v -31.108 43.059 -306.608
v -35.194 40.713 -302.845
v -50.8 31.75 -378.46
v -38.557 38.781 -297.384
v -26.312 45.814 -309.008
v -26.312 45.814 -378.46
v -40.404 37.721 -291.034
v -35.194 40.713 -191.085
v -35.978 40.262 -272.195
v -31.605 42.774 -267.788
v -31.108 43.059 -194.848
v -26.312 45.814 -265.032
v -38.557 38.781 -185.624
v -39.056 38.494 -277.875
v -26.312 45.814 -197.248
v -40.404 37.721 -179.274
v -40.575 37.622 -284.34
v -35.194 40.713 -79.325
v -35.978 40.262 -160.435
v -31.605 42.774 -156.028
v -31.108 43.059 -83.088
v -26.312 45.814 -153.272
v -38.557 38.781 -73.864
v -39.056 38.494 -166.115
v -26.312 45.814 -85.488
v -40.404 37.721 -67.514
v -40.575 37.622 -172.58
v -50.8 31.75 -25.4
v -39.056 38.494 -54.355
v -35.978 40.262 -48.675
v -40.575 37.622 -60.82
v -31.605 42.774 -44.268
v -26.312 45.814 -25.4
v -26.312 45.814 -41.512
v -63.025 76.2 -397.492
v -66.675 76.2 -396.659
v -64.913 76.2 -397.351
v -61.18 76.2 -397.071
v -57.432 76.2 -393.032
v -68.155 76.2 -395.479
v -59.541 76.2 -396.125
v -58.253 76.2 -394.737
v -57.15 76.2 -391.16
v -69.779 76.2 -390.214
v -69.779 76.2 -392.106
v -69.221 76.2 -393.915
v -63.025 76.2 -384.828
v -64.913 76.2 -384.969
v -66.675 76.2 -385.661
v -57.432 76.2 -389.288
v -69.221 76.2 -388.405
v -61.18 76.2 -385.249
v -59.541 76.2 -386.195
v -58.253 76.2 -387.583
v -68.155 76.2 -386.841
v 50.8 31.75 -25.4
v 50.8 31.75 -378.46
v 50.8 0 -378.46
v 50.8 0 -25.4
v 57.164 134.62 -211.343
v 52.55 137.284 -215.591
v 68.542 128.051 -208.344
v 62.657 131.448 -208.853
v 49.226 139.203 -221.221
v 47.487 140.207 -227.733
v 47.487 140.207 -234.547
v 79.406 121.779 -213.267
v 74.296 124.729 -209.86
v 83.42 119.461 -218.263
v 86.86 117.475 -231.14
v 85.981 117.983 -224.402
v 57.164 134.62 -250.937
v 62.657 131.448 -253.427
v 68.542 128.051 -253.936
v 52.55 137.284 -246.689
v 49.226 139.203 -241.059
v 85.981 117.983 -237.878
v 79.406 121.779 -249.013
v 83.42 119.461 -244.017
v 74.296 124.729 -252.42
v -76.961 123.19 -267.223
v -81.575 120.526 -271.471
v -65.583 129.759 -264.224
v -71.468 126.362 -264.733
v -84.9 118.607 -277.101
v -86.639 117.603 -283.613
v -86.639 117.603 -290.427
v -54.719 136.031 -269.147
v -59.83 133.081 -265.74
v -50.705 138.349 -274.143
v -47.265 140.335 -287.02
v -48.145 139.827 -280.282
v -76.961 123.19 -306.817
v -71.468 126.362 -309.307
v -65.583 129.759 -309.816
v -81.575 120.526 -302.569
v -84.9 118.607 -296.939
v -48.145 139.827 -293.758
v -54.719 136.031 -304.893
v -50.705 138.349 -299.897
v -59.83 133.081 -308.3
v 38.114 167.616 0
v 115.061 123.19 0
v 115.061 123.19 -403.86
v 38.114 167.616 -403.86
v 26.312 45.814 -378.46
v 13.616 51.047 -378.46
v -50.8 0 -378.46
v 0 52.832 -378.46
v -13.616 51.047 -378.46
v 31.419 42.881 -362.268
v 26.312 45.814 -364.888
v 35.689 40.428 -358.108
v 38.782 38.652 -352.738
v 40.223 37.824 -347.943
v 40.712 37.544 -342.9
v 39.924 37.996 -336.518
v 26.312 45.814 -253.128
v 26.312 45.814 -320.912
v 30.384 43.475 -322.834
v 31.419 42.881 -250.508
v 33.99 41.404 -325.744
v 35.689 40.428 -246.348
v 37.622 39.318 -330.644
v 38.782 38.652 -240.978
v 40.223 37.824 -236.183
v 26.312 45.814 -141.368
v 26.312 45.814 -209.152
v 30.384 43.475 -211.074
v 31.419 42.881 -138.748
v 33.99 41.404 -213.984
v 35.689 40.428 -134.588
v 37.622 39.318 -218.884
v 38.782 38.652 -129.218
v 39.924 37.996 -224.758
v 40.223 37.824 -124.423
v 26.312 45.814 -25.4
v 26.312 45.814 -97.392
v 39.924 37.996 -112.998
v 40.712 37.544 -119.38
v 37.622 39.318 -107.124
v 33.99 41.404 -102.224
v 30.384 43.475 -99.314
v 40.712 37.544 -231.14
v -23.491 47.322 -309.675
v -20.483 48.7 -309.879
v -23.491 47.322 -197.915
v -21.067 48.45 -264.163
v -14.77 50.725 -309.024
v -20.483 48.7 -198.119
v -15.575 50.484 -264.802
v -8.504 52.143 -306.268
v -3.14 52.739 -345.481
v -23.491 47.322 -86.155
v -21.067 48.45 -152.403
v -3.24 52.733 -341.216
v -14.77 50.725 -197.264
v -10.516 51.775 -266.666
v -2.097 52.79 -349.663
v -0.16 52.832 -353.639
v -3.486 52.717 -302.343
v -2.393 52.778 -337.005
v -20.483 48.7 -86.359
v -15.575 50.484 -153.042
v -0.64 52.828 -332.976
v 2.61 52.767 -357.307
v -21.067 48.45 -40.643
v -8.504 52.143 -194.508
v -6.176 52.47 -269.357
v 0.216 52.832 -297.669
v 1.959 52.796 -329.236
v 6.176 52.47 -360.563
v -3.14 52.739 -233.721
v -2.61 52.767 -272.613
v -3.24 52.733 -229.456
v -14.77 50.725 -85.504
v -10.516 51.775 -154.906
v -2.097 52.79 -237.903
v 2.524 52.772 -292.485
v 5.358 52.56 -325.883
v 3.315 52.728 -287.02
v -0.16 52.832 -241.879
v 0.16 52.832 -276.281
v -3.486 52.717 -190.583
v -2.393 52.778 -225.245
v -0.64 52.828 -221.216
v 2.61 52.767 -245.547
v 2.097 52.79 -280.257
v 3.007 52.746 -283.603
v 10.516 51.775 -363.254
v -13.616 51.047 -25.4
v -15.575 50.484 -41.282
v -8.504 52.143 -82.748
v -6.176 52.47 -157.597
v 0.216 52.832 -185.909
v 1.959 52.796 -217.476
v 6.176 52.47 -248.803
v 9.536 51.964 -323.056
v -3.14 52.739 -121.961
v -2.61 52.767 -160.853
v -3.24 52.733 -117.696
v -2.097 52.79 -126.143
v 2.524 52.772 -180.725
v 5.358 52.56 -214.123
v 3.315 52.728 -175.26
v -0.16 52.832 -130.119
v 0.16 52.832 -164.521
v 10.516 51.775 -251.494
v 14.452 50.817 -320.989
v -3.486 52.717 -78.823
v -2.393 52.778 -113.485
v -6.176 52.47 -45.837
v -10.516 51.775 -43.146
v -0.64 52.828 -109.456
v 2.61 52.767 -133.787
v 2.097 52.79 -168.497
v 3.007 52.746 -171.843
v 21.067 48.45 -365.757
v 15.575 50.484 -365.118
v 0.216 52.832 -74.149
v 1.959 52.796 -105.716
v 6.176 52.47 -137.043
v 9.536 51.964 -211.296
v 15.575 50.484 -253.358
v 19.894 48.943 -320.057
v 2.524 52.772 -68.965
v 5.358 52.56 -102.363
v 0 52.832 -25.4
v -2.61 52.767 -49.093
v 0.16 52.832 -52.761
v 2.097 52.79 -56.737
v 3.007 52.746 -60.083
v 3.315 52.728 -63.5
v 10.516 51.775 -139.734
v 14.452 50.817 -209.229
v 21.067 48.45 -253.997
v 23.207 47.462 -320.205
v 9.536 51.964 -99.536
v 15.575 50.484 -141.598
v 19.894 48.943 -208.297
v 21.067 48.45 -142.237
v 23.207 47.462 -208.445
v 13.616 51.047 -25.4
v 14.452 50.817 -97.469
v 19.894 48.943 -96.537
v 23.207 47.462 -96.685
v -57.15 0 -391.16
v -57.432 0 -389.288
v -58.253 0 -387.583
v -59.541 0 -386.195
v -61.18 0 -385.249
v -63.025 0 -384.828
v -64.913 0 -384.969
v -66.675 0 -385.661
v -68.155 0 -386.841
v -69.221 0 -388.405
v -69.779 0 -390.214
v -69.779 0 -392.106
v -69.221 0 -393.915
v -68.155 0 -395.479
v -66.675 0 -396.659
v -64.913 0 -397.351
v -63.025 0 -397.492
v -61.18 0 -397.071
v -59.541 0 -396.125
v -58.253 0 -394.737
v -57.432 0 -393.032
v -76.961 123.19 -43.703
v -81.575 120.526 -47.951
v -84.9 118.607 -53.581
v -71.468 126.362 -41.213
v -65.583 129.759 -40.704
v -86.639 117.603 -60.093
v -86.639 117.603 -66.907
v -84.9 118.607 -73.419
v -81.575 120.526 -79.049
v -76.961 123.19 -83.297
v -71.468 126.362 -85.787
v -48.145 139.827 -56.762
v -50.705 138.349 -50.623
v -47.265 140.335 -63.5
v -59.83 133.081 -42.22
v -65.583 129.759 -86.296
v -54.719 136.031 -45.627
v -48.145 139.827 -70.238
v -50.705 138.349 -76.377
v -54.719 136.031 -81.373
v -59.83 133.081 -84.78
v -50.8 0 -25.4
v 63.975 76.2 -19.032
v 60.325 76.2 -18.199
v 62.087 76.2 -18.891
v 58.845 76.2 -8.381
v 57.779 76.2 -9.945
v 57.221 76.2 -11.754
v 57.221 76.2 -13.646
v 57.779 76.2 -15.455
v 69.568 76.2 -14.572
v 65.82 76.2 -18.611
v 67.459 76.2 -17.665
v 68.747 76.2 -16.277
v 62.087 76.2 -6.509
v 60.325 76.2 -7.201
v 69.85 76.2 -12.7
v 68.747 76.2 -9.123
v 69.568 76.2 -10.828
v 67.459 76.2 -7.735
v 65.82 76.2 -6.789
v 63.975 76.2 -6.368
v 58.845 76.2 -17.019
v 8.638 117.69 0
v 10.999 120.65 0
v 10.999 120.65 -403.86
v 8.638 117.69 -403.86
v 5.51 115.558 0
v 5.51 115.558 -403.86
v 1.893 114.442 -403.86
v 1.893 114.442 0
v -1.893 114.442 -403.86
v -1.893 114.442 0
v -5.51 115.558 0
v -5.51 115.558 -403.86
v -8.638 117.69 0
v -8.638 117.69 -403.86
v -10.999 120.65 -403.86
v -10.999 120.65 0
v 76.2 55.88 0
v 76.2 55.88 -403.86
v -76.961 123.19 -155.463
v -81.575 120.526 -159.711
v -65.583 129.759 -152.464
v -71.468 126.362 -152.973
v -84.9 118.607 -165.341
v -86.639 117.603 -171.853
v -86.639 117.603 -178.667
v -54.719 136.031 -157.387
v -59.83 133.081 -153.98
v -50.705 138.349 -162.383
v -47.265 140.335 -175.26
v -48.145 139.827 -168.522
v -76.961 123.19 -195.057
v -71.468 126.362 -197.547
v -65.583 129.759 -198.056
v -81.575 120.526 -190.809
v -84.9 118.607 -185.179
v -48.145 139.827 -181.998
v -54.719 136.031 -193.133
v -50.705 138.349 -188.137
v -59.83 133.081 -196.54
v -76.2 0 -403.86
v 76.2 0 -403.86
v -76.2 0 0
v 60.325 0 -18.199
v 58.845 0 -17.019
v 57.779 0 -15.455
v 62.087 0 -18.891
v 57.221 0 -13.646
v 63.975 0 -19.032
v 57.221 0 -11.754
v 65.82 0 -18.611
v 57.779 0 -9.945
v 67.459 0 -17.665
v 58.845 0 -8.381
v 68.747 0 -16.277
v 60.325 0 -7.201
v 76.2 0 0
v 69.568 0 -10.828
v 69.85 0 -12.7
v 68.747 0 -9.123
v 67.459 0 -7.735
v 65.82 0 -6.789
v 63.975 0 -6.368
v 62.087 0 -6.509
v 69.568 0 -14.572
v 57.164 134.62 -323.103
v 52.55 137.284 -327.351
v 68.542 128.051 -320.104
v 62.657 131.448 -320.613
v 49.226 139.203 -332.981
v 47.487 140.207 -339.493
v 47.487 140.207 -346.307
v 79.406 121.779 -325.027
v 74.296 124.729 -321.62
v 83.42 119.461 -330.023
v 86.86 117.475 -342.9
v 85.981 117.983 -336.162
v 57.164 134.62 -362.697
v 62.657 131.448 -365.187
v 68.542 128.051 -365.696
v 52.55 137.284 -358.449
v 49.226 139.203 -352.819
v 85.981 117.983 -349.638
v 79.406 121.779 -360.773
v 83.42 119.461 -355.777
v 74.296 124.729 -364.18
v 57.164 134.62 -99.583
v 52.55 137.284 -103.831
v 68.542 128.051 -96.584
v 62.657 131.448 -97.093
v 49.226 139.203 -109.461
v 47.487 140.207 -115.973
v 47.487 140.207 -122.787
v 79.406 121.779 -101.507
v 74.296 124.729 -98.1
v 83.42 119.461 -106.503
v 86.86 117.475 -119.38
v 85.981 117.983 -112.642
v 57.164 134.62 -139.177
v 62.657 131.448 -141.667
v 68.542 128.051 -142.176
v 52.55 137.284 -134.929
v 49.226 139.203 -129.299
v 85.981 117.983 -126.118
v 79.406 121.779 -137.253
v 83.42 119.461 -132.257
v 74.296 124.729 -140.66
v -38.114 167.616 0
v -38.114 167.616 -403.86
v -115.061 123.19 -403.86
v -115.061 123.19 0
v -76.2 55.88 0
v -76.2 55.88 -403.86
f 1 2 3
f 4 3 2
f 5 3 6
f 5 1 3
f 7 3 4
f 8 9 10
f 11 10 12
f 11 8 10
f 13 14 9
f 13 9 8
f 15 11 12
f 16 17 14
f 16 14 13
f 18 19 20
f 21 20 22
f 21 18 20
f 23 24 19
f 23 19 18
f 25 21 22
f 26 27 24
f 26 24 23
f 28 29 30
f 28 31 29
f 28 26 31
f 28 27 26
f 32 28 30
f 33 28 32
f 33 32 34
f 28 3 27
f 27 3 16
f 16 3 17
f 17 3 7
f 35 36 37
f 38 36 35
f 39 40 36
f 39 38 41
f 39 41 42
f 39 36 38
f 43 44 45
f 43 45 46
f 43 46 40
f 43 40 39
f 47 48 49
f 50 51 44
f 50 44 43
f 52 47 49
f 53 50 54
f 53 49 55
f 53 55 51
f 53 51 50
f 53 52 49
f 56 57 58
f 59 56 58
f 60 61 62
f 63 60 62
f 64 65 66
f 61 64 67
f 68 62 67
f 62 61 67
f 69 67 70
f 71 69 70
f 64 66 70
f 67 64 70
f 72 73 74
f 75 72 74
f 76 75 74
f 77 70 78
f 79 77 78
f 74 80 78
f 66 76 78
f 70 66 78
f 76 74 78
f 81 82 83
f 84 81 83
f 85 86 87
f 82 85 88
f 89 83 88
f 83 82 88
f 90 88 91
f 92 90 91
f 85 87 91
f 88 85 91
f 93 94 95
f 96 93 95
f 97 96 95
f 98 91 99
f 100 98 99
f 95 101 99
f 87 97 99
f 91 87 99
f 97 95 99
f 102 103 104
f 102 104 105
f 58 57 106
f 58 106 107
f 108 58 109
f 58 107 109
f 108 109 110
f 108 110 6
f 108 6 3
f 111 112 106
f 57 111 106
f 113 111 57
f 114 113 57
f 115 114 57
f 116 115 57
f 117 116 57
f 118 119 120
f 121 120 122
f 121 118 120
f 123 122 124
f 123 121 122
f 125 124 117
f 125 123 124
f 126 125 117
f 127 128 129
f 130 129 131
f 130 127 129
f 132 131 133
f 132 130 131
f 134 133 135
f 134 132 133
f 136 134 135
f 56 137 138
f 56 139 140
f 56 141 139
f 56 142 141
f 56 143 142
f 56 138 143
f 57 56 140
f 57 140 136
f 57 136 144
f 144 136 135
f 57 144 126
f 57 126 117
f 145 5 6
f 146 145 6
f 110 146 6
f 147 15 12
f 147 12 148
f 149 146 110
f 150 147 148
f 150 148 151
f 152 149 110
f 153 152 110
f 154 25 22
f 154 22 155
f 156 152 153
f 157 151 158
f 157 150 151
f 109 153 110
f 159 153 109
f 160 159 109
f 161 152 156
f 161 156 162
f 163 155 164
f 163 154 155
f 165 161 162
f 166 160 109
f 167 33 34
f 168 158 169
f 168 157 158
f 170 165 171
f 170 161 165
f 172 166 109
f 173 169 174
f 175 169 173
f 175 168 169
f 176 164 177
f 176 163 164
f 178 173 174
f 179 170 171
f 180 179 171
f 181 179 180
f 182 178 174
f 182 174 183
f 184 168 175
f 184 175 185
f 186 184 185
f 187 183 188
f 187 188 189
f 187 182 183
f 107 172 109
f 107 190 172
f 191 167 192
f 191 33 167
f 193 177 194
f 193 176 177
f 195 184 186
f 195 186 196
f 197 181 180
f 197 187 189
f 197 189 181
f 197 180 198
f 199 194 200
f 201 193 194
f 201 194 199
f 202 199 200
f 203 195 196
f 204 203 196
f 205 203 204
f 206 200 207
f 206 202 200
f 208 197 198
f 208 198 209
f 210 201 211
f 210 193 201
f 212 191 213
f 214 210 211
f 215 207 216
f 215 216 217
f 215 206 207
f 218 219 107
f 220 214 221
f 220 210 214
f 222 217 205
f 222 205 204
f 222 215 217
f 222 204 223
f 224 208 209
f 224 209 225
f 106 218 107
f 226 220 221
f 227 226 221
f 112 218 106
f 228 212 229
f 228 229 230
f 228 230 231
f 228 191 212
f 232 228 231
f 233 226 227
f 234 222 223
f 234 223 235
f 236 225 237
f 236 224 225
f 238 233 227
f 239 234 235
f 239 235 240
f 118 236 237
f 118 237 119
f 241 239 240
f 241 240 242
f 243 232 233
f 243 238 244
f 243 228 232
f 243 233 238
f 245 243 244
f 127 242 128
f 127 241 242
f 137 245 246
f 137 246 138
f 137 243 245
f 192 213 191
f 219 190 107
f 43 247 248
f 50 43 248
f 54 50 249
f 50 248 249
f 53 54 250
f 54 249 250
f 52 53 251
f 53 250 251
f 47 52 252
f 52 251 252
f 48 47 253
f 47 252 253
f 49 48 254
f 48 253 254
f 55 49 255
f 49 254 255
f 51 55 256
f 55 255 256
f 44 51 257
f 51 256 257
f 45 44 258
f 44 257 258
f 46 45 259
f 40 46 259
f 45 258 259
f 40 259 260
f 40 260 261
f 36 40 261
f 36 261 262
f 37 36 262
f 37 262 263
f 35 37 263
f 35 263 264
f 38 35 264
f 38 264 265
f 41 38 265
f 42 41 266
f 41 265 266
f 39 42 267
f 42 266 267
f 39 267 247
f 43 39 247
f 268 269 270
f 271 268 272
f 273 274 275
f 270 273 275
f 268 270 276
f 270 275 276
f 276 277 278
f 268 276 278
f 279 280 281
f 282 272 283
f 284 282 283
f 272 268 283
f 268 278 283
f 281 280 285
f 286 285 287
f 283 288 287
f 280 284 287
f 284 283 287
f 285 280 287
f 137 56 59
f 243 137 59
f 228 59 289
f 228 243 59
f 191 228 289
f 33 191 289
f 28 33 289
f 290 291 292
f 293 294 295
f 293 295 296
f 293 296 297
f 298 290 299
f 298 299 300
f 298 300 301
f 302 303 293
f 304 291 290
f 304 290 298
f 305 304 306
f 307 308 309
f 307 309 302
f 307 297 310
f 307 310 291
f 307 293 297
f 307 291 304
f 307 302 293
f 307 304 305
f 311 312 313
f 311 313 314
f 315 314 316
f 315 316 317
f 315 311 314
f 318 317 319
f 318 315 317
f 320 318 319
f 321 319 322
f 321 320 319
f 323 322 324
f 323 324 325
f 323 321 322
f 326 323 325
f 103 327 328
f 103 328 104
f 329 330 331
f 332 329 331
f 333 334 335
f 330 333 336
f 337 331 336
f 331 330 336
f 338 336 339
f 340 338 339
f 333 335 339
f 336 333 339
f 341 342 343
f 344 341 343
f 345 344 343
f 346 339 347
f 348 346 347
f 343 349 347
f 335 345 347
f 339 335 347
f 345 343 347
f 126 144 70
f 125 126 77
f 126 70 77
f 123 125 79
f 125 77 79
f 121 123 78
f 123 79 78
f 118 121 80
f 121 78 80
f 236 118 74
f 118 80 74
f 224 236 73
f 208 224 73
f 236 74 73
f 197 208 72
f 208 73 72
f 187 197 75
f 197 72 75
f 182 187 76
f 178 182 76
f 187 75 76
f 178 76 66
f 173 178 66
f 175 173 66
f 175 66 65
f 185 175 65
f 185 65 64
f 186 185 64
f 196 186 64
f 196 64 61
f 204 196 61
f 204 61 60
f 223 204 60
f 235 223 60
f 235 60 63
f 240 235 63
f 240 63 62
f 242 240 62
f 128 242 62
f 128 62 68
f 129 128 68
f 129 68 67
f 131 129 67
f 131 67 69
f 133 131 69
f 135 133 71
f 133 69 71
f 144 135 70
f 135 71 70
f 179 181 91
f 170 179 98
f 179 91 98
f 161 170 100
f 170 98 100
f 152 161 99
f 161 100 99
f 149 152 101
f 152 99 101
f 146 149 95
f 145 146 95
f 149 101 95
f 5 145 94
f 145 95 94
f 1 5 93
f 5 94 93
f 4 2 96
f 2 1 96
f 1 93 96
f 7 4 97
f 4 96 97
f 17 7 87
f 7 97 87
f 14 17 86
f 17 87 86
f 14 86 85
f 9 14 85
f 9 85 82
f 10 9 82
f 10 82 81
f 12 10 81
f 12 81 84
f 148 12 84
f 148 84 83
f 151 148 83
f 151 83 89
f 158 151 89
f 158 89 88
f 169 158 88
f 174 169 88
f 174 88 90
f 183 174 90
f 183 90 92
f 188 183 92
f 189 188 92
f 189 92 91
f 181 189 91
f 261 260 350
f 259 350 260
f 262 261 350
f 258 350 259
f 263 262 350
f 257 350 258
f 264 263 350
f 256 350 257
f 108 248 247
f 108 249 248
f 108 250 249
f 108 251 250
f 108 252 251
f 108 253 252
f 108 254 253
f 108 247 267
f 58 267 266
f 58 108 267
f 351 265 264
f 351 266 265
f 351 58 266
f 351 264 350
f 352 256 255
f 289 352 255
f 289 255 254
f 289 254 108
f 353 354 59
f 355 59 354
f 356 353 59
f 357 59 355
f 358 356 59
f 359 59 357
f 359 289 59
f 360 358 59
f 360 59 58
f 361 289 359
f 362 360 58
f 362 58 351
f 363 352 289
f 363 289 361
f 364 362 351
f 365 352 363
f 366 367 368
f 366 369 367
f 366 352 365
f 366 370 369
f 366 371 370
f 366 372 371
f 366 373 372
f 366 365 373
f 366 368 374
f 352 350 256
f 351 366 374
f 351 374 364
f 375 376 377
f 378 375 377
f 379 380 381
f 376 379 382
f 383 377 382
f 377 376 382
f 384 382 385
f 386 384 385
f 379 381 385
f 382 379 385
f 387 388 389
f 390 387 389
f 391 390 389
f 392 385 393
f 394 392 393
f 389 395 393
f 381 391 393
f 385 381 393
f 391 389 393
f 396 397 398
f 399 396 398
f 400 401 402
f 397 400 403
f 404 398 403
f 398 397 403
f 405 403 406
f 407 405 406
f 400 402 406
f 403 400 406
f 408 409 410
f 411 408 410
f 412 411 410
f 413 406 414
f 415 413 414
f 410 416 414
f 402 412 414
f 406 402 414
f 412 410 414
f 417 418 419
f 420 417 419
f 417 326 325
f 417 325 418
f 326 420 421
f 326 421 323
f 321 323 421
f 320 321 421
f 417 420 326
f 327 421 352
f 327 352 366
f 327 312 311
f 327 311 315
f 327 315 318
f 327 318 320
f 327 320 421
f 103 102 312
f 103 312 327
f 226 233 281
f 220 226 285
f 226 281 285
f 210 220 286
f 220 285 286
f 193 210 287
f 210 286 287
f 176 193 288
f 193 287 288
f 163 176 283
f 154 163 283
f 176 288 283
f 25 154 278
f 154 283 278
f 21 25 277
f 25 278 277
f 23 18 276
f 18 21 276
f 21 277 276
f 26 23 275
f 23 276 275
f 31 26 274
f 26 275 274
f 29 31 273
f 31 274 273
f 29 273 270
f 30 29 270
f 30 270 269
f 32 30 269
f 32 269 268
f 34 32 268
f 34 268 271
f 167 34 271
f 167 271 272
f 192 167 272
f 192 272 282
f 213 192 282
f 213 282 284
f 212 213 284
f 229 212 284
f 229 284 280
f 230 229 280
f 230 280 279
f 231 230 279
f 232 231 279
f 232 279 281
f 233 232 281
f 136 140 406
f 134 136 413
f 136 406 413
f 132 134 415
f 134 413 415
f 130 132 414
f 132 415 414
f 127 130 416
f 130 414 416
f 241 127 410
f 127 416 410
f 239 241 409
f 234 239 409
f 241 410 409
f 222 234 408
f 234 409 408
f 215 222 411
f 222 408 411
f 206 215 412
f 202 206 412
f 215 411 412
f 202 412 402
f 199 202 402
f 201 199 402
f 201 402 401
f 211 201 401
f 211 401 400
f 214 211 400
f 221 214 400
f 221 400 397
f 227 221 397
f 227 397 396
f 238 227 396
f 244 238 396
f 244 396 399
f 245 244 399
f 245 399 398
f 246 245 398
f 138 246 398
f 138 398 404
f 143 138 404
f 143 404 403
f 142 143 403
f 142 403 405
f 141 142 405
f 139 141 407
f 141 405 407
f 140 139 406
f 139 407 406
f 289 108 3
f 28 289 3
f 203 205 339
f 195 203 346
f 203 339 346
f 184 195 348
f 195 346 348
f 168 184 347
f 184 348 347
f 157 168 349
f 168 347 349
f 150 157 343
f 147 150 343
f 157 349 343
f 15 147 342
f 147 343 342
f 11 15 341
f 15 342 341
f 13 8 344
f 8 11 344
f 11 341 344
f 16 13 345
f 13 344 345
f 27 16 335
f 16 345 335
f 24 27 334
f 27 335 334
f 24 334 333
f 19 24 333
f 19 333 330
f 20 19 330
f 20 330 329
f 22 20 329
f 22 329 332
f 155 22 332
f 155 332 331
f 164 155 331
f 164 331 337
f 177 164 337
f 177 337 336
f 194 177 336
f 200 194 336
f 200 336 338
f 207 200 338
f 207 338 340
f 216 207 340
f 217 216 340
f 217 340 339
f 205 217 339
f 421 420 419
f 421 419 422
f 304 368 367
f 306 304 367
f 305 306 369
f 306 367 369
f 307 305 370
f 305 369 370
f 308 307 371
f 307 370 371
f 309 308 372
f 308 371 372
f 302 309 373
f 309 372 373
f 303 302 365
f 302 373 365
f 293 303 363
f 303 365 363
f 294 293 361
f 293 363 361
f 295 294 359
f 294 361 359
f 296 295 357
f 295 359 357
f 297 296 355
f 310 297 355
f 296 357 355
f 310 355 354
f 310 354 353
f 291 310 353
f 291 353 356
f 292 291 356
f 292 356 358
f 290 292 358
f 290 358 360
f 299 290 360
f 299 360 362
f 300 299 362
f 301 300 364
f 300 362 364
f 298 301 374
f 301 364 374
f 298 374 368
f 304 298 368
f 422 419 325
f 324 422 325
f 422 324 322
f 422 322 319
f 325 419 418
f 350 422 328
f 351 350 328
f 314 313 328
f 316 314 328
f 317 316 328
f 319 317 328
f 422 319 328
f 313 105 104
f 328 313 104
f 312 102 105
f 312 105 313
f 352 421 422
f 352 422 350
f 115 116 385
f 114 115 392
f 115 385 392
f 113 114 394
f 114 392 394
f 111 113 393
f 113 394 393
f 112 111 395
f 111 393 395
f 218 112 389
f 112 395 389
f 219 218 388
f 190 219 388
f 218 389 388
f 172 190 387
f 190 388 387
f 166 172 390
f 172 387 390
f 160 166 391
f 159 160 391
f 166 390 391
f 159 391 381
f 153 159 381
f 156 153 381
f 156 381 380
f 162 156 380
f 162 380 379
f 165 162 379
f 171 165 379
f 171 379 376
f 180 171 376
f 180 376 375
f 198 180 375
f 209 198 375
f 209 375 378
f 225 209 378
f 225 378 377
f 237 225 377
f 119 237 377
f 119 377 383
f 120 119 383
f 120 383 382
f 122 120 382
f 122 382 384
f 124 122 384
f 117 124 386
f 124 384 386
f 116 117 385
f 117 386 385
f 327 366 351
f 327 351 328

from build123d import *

# Parameters (mm, degrees)
BOSS_EXTRUDE1_DEPTH = 403.86
CUT_EXTRUDE1_START  = -19.05
SKETCH3_R           = 22.86
CUT_EXTRUDE1_DEPTH  = 203.697116111
CUT_EXTRUDE2_START  = -19.05
SKETCH4_R           = 22.86
CUT_EXTRUDE2_DEPTH  = 203.697116111
CUT_EXTRUDE4_START  = -25.4
CUT_EXTRUDE4_DEPTH  = 353.06
SKETCH7_R           = 6.35
CUT_EXTRUDE5_DEPTH  = 76.2


with BuildPart() as part:
    # Sketch1 → Boss-Extrude1 (new body)
    with BuildSketch(Plane.XY):
        with BuildLine():
            Line((-10.998522628, 120.65), (-38.114105889, 167.615567884))
            Line((-38.114105889, 167.615567884), (-115.061446619, 123.19))
            Line((-115.061446619, 123.19), (-76.2, 55.88))
            Line((-76.2, 55.88), (-76.2, 0))
            Line((-76.2, 0), (76.2, 0))
            Line((76.2, 0), (76.2, 55.88))
            Line((76.2, 55.88), (115.061446619, 123.19))
            Line((115.061446619, 123.19), (38.114105889, 167.615567884))
            Line((38.114105889, 167.615567884), (10.998522628, 120.65))
            ThreePointArc((10.998522628, 120.65), (0, 114.3), (-10.998522628, 120.65))
        make_face()
    extrude(amount=-BOSS_EXTRUDE1_DEPTH)

    # Sketch3 → Cut-Extrude1 (cut, through all)
    with BuildSketch(Plane(origin=(82.108196401, 142.215567884, 0), x_dir=(0.866025404, -0.5, 0), z_dir=(0.5, 0.866025404, 0)).offset(CUT_EXTRUDE1_START)):
        with Locations((-6.374432116, 119.38)):
            Circle(SKETCH3_R)
        with Locations((-6.374432116, 231.14)):
            Circle(SKETCH3_R)
        with Locations((-6.374432116, 342.9)):
            Circle(SKETCH3_R)
    extrude(amount=-CUT_EXTRUDE1_DEPTH, mode=Mode.SUBTRACT)

    # Sketch4 → Cut-Extrude2 (cut, through all)
    with BuildSketch(Plane(origin=(-82.108196401, 142.215567884, 0), x_dir=(0.866025404, 0.5, 0), z_dir=(-0.5, 0.866025404, 0)).offset(CUT_EXTRUDE2_START)):
        with Locations((6.374432116, 63.5)):
            Circle(SKETCH4_R)
        with Locations((6.374432116, 175.26)):
            Circle(SKETCH4_R)
        with Locations((6.374432116, 287.02)):
            Circle(SKETCH4_R)
    extrude(amount=-CUT_EXTRUDE2_DEPTH, mode=Mode.SUBTRACT)

    # Sketch5 → Cut-Extrude4 (cut)
    with BuildSketch(Plane.XY.offset(CUT_EXTRUDE4_START)):
        with BuildLine():
            Line((-50.8, 0), (-50.8, 31.75))
            Line((-50.8, 31.75), (-26.311519178, 45.814017315))
            ThreePointArc((-26.311519178, 45.814017315), (0, 52.832), (26.311519178, 45.814017315))
            Line((26.311519178, 45.814017315), (50.8, 31.75))
            Line((50.8, 31.75), (50.8, 0))
            Line((50.8, 0), (-50.8, 0))
        make_face()
    extrude(amount=-CUT_EXTRUDE4_DEPTH, mode=Mode.SUBTRACT)

    # Sketch7 → Cut-Extrude5 (cut)
    with BuildSketch(Plane.XZ):
        with Locations((-63.5, -391.16)):
            Circle(SKETCH7_R)
        with Locations((63.5, -12.7)):
            Circle(SKETCH7_R)
    extrude(amount=-CUT_EXTRUDE5_DEPTH, mode=Mode.SUBTRACT)


solid = part.part
